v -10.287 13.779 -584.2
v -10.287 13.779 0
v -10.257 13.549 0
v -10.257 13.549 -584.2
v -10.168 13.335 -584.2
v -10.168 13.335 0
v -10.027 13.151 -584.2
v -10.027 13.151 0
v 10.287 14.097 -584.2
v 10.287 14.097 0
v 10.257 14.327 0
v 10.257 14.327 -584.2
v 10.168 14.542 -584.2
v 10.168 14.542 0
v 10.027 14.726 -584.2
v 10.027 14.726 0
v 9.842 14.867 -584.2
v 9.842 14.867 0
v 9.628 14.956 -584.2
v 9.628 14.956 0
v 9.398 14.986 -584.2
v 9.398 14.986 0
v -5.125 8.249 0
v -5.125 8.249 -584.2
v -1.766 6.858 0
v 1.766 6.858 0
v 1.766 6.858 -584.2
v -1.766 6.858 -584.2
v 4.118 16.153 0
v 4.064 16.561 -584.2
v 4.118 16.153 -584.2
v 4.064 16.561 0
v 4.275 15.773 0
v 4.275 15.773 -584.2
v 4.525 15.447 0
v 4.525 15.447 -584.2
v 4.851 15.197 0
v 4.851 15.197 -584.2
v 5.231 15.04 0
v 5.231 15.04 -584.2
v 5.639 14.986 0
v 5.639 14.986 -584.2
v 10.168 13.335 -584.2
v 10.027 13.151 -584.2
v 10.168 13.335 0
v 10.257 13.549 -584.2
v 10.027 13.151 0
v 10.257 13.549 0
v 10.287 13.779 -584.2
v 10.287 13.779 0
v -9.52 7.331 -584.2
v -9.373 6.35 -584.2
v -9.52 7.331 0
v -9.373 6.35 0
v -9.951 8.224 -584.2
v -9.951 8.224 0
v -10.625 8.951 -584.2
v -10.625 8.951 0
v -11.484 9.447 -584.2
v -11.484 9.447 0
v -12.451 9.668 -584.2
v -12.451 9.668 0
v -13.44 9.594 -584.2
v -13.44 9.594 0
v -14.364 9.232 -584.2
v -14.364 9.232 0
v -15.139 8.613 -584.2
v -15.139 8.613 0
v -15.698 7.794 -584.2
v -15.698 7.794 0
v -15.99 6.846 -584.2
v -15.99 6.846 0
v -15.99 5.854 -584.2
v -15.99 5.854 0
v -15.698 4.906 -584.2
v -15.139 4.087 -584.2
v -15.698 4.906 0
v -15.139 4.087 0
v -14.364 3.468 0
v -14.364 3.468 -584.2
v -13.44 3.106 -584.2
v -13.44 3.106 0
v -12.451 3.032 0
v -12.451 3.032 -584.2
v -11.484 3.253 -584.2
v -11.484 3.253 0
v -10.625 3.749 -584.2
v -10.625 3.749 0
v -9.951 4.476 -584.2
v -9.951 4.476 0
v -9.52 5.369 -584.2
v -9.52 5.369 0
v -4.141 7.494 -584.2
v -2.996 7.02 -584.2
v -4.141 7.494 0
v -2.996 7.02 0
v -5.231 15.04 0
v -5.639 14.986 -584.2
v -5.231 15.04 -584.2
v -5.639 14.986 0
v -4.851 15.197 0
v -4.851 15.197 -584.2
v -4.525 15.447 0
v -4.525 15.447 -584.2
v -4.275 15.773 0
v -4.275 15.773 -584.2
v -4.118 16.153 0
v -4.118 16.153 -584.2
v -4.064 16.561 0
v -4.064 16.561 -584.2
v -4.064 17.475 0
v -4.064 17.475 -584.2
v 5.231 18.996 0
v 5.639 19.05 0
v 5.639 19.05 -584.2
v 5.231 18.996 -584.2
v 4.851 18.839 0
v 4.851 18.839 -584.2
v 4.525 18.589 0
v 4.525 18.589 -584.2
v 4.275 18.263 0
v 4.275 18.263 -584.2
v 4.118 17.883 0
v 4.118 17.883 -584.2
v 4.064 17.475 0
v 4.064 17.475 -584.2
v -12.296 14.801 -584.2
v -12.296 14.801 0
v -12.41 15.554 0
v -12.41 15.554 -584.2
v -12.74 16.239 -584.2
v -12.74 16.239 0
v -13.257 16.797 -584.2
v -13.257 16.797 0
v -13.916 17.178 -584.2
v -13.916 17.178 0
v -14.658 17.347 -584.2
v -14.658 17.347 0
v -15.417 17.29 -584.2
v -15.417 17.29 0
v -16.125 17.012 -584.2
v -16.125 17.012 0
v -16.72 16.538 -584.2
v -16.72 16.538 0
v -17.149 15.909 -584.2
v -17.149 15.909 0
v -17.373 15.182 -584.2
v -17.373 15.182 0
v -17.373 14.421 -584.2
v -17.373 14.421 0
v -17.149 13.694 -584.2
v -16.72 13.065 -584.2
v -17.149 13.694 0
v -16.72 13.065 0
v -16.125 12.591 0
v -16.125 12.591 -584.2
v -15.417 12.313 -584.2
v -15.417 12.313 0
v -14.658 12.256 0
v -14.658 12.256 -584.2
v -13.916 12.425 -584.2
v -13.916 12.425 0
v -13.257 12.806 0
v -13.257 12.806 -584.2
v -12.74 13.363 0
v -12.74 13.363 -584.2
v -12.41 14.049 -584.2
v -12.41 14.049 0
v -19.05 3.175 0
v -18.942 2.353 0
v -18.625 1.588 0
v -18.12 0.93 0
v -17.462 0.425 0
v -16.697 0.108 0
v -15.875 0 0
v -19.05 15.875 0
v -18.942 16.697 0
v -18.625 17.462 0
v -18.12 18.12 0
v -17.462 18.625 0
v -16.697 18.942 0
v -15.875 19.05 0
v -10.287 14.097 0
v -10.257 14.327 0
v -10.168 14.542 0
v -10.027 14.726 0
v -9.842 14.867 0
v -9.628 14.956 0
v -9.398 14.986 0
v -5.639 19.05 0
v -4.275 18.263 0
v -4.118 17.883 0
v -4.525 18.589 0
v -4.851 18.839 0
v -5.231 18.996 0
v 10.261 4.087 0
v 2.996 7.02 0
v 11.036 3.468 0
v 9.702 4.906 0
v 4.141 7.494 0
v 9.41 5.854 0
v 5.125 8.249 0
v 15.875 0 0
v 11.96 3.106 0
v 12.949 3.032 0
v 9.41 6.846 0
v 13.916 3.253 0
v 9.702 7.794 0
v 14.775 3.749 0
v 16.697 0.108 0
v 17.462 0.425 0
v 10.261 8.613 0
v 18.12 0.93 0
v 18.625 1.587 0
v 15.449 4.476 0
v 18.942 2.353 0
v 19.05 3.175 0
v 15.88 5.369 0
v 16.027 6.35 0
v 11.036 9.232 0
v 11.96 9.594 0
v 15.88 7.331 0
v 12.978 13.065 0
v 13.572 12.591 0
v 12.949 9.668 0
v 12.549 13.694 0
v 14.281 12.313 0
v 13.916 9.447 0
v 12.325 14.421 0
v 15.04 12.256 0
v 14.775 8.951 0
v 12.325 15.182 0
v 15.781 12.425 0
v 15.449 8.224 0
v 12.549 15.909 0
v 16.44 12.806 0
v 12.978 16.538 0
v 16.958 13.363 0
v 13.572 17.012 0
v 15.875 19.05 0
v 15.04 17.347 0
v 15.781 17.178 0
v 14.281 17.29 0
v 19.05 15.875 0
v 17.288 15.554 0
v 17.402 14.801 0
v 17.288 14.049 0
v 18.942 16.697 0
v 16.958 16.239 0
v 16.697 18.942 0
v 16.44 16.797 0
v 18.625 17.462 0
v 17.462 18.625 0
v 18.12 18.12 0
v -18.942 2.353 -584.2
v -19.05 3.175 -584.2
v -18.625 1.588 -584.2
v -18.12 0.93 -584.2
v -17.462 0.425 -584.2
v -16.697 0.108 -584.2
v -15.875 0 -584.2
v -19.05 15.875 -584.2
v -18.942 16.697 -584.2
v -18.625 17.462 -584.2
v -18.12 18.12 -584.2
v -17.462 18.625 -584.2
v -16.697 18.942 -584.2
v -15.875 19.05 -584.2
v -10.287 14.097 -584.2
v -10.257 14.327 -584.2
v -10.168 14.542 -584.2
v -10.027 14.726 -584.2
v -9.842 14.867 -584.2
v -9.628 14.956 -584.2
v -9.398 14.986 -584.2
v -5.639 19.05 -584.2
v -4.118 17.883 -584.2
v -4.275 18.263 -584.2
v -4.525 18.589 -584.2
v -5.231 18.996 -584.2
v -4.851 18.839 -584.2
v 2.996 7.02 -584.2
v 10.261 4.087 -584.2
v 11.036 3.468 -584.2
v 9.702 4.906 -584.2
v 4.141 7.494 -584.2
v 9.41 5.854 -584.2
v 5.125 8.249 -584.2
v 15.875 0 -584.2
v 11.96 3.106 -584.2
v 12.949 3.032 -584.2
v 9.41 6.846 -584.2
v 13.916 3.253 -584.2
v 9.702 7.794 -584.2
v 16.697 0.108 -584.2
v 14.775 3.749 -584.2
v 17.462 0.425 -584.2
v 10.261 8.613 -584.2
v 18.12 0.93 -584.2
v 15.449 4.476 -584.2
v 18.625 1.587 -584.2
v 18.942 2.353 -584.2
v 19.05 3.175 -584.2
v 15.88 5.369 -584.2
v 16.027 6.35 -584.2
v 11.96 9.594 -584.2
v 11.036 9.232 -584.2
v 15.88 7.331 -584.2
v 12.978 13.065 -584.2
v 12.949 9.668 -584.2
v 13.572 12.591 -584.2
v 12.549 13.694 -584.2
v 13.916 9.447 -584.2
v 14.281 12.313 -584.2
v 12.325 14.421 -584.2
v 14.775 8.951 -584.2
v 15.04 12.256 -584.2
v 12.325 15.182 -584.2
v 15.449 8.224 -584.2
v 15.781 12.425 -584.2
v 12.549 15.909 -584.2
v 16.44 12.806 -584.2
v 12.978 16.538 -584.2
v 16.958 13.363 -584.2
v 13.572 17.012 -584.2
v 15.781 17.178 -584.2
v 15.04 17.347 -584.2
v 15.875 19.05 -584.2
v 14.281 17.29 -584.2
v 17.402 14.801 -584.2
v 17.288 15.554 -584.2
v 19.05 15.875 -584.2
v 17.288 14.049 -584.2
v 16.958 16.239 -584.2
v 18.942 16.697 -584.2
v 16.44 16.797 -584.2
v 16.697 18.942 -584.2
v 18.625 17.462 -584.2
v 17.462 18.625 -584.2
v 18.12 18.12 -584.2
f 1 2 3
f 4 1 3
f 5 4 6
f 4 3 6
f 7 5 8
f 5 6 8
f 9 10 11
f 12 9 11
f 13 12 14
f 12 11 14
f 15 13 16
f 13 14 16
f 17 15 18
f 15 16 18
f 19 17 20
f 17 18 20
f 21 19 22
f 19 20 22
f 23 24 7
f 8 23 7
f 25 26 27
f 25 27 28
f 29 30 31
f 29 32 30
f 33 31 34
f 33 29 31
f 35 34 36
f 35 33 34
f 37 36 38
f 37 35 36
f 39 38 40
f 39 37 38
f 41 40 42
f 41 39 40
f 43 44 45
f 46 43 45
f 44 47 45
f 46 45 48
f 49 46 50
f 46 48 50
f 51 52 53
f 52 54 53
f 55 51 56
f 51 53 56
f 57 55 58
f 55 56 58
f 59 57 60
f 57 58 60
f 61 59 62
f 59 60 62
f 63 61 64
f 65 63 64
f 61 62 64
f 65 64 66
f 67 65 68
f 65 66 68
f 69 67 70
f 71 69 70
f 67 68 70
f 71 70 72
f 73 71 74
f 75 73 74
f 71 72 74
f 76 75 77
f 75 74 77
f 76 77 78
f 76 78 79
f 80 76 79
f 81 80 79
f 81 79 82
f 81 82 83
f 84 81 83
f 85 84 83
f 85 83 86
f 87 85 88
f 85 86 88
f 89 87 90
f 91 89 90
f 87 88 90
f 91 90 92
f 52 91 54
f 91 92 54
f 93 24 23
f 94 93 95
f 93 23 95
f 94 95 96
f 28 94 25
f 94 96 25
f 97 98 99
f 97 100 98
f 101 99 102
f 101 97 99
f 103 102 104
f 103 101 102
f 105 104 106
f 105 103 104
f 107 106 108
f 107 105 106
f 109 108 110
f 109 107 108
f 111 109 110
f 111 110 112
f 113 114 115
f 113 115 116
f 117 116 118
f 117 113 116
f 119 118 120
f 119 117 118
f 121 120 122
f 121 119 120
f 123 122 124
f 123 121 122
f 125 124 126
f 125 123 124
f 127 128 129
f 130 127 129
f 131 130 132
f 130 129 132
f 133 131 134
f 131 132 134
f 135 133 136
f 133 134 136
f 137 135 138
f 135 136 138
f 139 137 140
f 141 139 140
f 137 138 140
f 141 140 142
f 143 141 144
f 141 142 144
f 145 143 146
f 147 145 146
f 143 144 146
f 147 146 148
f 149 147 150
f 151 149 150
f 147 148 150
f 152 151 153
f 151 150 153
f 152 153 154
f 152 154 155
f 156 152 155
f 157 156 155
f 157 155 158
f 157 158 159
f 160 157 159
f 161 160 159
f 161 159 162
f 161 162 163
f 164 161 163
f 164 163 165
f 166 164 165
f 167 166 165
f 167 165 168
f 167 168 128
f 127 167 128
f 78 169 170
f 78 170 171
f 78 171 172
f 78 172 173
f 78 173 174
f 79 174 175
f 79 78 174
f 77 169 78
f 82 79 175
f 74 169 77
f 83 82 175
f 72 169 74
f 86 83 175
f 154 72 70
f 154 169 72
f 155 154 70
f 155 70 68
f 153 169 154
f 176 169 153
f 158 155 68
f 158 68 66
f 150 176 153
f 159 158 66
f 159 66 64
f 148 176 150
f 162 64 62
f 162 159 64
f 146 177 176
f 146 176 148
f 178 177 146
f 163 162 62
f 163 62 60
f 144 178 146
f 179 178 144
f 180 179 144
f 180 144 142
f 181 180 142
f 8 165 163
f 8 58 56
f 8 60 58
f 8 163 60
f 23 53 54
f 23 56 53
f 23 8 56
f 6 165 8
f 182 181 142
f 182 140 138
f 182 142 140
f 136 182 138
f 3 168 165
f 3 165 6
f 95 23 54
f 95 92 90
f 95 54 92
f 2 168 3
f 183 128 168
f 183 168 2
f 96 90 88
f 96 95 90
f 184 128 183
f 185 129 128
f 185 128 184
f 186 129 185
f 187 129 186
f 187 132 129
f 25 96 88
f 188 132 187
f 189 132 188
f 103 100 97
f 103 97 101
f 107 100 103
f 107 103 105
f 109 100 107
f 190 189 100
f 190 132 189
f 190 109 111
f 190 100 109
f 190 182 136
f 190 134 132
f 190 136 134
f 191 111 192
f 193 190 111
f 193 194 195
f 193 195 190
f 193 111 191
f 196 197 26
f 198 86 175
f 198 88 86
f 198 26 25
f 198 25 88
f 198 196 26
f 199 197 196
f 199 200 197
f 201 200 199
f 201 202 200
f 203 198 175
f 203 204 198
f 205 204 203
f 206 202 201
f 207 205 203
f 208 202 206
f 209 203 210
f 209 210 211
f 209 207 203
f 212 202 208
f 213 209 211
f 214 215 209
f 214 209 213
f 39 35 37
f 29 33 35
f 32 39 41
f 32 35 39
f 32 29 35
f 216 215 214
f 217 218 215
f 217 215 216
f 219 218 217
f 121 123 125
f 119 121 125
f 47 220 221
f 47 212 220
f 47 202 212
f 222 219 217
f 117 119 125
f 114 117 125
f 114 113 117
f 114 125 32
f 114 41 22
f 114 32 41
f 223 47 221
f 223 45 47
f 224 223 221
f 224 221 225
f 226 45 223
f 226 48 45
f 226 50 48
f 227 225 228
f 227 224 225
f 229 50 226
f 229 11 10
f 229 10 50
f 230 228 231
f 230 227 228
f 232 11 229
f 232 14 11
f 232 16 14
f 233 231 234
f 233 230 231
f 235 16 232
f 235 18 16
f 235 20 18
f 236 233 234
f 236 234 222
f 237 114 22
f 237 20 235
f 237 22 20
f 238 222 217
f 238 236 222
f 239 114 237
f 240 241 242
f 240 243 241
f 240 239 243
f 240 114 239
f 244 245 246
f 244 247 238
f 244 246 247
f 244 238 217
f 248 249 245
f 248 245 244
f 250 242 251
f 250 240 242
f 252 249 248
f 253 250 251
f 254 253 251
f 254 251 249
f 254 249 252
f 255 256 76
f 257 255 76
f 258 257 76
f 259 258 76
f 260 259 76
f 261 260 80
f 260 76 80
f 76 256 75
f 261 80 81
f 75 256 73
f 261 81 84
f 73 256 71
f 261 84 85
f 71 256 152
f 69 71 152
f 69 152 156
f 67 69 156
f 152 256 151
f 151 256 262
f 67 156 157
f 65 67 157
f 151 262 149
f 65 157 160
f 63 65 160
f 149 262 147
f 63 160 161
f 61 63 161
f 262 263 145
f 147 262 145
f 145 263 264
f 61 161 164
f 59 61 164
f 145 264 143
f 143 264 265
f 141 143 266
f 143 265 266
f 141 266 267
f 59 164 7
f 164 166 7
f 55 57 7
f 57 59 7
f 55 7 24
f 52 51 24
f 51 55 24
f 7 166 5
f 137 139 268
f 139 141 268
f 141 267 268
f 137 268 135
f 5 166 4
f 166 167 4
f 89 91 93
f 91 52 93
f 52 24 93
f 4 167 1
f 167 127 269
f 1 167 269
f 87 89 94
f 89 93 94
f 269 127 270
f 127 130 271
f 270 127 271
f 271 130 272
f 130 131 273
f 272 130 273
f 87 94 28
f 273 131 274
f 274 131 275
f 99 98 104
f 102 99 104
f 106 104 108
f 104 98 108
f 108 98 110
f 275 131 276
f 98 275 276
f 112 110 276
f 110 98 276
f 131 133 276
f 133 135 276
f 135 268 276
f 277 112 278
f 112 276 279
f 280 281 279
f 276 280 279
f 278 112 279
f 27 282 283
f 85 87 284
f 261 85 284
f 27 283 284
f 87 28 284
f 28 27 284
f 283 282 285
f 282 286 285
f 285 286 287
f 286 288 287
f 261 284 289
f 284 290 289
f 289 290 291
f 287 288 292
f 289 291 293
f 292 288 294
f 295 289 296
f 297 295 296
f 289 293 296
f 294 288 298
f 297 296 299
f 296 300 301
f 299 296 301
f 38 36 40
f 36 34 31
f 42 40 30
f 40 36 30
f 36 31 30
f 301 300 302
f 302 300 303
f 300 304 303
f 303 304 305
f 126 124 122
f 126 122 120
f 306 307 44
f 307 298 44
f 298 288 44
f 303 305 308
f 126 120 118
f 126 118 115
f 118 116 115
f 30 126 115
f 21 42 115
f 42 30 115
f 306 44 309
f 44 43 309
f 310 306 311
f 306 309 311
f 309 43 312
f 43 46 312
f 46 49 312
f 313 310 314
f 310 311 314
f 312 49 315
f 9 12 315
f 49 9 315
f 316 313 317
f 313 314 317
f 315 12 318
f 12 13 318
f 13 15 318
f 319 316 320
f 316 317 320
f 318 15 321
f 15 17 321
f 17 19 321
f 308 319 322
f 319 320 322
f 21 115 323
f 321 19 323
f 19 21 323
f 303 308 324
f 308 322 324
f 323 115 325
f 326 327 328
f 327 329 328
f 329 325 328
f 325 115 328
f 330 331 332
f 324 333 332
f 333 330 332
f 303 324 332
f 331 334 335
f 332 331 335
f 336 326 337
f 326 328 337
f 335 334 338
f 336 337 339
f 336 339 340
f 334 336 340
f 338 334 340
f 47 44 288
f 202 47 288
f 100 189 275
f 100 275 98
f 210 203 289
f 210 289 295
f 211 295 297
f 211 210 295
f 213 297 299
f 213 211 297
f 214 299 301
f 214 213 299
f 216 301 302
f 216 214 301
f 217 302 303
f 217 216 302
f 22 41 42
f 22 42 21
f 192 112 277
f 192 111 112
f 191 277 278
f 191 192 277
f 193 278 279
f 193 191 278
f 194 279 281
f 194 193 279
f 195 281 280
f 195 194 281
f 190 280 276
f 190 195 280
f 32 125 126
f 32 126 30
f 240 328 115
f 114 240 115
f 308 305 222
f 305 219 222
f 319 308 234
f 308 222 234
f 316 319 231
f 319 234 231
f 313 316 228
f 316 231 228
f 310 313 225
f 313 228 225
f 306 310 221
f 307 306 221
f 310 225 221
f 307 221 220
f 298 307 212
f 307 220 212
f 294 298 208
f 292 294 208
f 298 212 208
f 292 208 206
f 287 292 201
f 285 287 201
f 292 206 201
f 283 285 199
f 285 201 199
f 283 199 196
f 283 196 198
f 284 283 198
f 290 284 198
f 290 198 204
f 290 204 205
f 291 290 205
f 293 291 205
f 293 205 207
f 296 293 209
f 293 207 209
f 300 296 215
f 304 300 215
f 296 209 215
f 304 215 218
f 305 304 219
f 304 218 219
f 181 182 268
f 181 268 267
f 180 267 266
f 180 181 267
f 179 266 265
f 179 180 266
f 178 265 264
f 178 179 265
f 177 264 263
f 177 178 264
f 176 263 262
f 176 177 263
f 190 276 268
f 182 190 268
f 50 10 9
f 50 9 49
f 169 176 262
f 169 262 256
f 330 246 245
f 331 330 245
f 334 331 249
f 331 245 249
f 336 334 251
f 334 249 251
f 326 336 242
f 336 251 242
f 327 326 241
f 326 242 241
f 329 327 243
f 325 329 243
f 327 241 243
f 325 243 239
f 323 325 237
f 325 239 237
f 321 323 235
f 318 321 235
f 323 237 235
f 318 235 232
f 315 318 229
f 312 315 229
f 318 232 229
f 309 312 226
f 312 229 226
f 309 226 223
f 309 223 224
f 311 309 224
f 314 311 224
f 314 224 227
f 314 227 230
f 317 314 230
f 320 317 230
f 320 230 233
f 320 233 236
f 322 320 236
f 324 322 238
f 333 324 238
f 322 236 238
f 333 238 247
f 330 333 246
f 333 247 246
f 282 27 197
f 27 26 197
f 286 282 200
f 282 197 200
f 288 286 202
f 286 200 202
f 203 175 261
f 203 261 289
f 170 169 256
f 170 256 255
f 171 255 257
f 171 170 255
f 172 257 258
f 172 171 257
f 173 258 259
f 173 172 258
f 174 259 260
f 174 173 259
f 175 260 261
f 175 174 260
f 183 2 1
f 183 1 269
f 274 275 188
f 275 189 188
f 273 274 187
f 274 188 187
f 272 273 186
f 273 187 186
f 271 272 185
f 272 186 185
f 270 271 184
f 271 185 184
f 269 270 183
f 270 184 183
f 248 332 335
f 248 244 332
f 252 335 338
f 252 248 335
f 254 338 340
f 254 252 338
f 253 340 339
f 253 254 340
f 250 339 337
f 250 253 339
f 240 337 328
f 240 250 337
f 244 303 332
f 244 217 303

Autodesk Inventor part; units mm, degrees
ref_plane "YZ Plane" through (0, 0, 0) normal (1, 0, 0) x (0, 1, 0)
ref_plane "XZ Plane" through (0, 0, 0) normal (0, 1, 0) x (-1, 0, 0)
ref_plane "XY Plane" through (0, 0, 0) normal (0, 0, 1) x (1, 0, 0)
sketch "Sketch_1" plane through (0, 0, 0) normal (0, 0, 1) x (1, 0, 0)
  arc A0 (-19.05, 3.175) -> (-15.875, 0) centre (-15.875, 3.175) ccw
  line L0 (-15.875, 0) -> (15.875, 0)
  arc A1 (15.875, 0) -> (19.05, 3.175) centre (15.875, 3.175) ccw
  line L1 (19.05, 3.175) -> (19.05, 15.875)
  arc A2 (19.05, 15.875) -> (15.875, 19.05) centre (15.875, 15.875) ccw
  line L2 (15.875, 19.05) -> (5.6388, 19.05)
  arc A3 (5.6388, 19.05) -> (4.064, 17.4752) centre (5.6388, 17.4752) ccw
  line L3 (4.064, 17.4752) -> (4.064, 16.5608)
  arc A4 (4.064, 16.5608) -> (5.6388, 14.986) centre (5.6388, 16.5608) ccw
  line L4 (5.6388, 14.986) -> (9.398, 14.986)
  arc A5 (10.287, 14.097) -> (9.398, 14.986) centre (9.398, 14.097) ccw
  line L5 (10.287, 14.097) -> (10.287, 13.7794)
  arc A6 (10.0266, 13.1508) -> (10.287, 13.7794) centre (9.398, 13.7794) ccw
  line L6 (10.0266, 13.1508) -> (5.125, 8.2492)
  arc A7 (1.7664, 6.858) -> (5.125, 8.2492) centre (1.7664, 11.6078) ccw
  line L7 (1.7664, 6.858) -> (-1.7664, 6.858)
  arc A8 (-5.125, 8.2492) -> (-1.7664, 6.858) centre (-1.7664, 11.6078) ccw
  line L8 (-5.125, 8.2492) -> (-10.0266, 13.1508)
  arc A9 (-10.287, 13.7794) -> (-10.0266, 13.1508) centre (-9.398, 13.7794) ccw
  line L9 (-10.287, 13.7794) -> (-10.287, 14.097)
  arc A10 (-9.398, 14.986) -> (-10.287, 14.097) centre (-9.398, 14.097) ccw
  line L10 (-9.398, 14.986) -> (-5.6388, 14.986)
  arc A11 (-5.6388, 14.986) -> (-4.064, 16.5608) centre (-5.6388, 16.5608) ccw
  line L11 (-4.064, 16.5608) -> (-4.064, 17.4752)
  arc A12 (-4.064, 17.4752) -> (-5.6388, 19.05) centre (-5.6388, 17.4752) ccw
  line L12 (-5.6388, 19.05) -> (-15.875, 19.05)
  arc A13 (-15.875, 19.05) -> (-19.05, 15.875) centre (-15.875, 15.875) ccw
  line L13 (-19.05, 15.875) -> (-19.05, 3.175)
  circle A14 centre (14.8488, 14.8014) radius 2.5527
  circle A15 centre (12.7, 6.35) radius 3.3274
  circle A16 centre (-12.7, 6.35) radius 3.3274
  circle A17 centre (-14.8488, 14.8014) radius 2.5527
extrude "Extrusion1" add sketch "Sketch_1" against normal blind 584.2
properties part number "Cross Brace"
